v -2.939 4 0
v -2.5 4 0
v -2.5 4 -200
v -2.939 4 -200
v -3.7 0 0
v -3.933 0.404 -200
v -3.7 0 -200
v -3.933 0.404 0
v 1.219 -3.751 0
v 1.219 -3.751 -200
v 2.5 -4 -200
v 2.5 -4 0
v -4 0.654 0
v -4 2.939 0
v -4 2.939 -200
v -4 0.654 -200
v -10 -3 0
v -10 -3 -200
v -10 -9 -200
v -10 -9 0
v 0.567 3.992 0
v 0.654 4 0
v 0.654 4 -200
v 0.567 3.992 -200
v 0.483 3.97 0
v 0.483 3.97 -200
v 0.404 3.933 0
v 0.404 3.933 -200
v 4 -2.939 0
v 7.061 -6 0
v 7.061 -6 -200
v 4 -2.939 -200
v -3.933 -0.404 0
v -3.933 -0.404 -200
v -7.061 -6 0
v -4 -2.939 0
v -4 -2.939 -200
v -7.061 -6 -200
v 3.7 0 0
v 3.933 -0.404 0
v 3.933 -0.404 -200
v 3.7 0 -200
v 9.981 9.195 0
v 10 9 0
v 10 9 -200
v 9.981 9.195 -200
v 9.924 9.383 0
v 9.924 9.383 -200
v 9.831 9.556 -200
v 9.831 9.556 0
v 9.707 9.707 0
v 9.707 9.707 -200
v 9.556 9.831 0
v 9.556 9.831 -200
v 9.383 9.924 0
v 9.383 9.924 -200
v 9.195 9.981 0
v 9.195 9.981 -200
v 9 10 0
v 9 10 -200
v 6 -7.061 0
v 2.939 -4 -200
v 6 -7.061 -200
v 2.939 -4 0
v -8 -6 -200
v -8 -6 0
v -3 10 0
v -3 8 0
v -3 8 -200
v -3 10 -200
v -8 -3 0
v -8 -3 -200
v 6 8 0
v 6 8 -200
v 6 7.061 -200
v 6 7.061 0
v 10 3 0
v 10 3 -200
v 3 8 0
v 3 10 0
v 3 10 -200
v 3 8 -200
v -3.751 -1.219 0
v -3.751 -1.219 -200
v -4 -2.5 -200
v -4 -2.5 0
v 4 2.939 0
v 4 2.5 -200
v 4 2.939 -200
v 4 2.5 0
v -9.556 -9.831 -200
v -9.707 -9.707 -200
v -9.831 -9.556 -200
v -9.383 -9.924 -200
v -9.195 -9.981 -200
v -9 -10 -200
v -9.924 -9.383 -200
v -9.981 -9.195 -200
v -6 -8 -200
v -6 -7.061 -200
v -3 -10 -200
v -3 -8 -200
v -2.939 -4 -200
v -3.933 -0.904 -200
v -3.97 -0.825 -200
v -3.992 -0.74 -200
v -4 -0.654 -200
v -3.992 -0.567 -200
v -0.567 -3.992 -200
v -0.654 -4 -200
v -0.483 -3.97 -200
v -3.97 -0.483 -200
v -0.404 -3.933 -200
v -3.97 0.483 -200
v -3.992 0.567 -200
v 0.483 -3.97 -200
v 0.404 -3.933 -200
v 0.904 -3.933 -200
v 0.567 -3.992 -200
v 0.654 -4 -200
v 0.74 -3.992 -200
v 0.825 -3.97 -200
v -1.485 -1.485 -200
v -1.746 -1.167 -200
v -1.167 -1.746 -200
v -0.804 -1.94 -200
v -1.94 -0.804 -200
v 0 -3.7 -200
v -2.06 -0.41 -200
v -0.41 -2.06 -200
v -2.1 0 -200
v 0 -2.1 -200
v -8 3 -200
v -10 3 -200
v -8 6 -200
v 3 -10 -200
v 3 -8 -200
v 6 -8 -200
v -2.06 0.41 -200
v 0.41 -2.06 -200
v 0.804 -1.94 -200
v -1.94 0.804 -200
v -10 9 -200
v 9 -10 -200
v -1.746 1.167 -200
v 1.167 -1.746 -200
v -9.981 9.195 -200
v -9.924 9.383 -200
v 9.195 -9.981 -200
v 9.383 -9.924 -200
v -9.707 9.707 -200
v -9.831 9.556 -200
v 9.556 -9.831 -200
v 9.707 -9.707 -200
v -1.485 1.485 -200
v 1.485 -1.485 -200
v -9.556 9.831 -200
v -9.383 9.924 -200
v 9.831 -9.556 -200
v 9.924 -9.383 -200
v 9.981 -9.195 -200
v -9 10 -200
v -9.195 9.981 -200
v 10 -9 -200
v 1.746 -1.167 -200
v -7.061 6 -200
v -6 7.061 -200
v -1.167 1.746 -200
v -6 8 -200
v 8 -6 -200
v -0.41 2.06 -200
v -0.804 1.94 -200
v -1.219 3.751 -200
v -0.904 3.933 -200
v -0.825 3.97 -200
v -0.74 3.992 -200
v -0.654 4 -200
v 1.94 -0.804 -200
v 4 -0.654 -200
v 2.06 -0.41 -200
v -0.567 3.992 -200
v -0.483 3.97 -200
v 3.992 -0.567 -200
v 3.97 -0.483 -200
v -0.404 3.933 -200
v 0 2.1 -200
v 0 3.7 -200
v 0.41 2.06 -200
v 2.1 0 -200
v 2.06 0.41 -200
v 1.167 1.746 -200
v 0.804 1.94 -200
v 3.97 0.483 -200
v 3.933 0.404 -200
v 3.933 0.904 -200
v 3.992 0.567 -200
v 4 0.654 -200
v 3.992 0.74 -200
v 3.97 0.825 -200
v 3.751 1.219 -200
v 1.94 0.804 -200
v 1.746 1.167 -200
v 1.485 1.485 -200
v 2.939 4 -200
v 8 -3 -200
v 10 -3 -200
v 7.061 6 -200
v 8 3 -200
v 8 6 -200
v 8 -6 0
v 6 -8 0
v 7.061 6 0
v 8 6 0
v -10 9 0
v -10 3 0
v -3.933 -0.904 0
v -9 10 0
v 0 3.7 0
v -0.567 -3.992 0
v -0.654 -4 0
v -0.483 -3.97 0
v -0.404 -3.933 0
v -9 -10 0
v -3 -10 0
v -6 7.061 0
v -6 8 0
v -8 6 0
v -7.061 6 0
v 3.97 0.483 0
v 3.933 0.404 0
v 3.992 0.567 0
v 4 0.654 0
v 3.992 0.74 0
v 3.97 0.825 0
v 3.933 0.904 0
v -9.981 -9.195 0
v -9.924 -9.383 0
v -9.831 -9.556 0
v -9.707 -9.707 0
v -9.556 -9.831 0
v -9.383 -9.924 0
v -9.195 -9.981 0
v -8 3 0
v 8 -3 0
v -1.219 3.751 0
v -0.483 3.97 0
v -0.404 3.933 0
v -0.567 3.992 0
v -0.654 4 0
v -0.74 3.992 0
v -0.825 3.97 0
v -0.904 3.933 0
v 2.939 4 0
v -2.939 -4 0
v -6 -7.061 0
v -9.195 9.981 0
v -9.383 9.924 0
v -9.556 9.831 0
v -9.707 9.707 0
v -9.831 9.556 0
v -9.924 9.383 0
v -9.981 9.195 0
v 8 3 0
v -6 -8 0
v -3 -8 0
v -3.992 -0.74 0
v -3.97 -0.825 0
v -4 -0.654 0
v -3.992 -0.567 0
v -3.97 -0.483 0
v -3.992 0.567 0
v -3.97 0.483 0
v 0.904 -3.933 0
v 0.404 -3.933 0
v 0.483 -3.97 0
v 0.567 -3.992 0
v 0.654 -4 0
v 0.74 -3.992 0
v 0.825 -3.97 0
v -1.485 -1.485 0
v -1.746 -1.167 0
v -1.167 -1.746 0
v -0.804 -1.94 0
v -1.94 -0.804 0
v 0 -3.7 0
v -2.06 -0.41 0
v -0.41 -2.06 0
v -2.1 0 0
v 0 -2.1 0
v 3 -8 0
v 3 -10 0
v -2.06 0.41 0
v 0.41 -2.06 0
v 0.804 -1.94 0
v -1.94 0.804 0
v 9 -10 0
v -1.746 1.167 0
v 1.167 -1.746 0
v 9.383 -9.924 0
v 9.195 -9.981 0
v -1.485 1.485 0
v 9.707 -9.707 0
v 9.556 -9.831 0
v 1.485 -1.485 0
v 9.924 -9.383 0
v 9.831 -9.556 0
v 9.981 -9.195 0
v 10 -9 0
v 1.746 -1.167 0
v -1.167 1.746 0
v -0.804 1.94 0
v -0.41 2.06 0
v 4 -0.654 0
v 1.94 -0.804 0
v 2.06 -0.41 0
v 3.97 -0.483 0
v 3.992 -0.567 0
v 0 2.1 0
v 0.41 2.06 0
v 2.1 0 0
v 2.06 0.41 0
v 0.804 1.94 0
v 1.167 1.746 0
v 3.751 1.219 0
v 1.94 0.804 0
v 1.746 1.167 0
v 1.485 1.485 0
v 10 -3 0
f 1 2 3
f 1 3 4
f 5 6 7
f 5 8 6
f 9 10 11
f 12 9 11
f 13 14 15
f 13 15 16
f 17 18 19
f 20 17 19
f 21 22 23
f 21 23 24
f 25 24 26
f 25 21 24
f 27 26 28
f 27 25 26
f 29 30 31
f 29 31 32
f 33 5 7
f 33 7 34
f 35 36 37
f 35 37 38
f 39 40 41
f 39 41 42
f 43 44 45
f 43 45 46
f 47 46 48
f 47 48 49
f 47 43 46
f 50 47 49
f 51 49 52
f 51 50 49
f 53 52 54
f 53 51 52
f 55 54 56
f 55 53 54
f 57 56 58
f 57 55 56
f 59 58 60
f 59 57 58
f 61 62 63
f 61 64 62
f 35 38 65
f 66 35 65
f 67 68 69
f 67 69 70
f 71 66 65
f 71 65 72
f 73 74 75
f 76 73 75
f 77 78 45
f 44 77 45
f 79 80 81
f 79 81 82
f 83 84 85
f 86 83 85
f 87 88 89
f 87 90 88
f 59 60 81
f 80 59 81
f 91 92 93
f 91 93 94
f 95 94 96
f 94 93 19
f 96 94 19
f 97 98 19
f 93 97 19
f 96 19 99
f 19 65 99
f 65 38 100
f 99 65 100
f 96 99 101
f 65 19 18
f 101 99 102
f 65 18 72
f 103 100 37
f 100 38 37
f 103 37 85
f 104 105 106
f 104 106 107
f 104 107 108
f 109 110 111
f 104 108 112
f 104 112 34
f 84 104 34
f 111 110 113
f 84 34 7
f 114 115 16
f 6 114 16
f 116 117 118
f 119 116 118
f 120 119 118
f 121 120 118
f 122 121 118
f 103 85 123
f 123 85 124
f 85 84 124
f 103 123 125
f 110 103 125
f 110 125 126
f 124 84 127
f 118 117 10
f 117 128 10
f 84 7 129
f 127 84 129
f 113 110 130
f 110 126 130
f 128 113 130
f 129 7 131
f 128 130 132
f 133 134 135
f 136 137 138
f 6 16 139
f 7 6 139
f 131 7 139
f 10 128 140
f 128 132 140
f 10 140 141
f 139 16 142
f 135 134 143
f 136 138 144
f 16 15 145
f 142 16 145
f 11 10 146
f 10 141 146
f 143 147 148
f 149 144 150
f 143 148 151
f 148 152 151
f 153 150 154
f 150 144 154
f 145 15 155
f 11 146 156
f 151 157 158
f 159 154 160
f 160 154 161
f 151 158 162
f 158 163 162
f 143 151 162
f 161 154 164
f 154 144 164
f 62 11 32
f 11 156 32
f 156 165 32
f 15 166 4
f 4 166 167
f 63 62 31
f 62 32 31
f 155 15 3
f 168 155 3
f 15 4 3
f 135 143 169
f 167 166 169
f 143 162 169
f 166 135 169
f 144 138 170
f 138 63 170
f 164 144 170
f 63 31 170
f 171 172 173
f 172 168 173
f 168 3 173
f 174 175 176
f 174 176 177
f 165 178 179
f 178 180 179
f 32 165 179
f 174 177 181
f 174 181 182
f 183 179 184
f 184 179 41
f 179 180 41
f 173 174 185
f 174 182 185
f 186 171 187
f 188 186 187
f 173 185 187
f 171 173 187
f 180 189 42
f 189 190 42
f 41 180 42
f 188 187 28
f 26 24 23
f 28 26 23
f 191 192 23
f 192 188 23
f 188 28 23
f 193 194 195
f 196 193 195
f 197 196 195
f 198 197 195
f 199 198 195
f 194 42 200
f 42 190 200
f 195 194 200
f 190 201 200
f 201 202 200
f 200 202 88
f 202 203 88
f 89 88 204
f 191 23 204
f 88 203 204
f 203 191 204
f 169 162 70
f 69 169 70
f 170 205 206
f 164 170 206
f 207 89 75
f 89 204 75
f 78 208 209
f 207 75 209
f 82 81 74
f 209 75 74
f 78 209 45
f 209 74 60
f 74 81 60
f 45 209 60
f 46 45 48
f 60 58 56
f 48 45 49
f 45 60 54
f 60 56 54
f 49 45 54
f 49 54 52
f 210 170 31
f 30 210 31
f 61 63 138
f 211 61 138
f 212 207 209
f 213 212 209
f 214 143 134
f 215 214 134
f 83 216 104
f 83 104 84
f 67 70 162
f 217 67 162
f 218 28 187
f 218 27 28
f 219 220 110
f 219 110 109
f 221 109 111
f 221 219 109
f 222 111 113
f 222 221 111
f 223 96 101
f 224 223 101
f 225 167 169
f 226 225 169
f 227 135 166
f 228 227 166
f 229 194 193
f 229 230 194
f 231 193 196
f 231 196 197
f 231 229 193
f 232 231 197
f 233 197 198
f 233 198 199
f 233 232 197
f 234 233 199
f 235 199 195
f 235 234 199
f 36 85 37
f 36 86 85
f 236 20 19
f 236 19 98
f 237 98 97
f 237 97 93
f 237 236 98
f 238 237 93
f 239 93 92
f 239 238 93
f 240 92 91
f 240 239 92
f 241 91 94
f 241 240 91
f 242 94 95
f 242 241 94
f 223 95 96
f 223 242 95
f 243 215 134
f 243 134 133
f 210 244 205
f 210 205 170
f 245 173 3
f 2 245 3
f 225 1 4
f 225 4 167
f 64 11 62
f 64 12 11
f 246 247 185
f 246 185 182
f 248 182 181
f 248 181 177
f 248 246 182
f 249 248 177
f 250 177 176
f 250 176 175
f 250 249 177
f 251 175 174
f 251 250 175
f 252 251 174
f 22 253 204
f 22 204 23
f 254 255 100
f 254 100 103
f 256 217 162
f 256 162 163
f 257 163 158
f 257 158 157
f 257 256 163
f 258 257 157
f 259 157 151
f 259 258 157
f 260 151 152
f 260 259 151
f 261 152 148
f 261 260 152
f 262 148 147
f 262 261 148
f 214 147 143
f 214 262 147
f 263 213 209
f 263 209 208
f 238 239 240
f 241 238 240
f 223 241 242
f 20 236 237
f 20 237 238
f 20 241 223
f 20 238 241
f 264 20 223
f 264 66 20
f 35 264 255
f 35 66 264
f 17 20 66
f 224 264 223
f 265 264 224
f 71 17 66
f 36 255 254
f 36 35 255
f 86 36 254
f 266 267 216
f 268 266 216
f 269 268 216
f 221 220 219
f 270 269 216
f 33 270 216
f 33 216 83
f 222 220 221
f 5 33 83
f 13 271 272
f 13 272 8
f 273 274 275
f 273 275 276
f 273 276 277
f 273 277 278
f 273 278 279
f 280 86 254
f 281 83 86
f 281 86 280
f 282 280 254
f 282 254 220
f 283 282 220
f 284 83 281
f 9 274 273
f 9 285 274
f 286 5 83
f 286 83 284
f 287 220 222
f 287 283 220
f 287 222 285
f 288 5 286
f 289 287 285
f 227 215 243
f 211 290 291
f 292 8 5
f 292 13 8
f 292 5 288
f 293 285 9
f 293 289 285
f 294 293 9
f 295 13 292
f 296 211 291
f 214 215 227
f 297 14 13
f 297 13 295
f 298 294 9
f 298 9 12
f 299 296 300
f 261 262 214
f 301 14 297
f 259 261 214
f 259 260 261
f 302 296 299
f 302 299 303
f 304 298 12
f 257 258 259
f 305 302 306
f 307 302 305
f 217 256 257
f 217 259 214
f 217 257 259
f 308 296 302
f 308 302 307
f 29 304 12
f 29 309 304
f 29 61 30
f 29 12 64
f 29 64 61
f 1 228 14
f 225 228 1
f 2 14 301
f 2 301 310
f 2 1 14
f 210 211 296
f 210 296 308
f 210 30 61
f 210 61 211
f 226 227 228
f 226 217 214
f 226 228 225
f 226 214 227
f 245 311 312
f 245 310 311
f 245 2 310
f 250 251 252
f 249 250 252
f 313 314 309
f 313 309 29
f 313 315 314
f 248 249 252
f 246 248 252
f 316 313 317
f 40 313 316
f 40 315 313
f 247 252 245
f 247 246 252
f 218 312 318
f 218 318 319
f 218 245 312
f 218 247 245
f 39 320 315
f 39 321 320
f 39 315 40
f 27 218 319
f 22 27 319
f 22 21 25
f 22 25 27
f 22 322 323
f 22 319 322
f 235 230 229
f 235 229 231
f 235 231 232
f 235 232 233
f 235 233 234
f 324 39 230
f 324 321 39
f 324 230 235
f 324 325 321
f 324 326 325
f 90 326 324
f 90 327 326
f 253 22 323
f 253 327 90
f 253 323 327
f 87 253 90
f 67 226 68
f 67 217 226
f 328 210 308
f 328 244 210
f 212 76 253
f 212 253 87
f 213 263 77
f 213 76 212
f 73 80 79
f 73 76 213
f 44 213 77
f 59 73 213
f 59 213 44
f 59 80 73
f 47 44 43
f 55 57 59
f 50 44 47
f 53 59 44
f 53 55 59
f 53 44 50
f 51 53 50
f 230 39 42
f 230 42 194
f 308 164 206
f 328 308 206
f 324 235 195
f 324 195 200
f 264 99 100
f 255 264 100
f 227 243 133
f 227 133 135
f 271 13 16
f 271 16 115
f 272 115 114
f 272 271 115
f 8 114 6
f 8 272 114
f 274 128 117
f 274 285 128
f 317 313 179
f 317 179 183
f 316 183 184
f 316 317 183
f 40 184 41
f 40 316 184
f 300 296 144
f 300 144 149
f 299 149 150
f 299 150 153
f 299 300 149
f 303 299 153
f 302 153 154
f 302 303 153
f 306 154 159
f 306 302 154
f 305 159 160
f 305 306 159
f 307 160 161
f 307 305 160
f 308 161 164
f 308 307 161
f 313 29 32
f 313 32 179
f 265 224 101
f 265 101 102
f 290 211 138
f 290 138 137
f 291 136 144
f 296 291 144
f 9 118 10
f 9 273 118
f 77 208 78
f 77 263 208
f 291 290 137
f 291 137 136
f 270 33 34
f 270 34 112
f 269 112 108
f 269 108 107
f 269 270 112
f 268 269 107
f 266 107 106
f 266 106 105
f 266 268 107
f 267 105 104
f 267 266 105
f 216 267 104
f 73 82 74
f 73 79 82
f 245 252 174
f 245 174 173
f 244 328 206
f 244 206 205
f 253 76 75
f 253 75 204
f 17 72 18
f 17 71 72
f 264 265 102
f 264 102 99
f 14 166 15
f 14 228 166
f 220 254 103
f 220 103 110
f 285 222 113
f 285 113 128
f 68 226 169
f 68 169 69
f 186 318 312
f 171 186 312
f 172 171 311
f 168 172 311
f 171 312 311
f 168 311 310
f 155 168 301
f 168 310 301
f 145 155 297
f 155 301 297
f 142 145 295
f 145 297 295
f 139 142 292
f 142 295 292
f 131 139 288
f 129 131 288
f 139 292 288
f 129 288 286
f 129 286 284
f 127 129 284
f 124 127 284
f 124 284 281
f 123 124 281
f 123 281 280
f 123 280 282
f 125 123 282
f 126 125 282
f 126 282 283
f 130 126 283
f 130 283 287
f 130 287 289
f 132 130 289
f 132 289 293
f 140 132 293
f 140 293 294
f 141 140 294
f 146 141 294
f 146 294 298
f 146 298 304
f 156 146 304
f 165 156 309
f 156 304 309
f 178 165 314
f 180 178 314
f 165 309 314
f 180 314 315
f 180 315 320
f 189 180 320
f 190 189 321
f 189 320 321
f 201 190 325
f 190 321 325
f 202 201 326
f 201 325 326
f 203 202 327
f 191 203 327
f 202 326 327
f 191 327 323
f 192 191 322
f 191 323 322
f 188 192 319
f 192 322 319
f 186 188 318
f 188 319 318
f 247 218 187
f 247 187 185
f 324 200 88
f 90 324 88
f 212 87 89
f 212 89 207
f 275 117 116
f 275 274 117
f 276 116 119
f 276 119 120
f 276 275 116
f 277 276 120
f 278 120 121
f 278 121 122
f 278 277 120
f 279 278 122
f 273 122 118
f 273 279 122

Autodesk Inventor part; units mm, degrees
sketch "Sketch_75" plane through (0, 0, 0) normal (0, 0, 1) x (1, 0, 0)
  line L0 (-10, -3) -> (-10, -9)
  arc A0 (-10, -9) -> (-9, -10) centre (-9, -9) ccw
  line L1 (-9, -10) -> (-3, -10)
  line L2 (-3, -10) -> (-3, -8)
  line L3 (-3, -8) -> (-6, -8)
  line L4 (-6, -8) -> (-6, -7.0607)
  line L5 (-6, -7.0607) -> (-2.9393, -4)
  line L6 (-2.9393, -4) -> (-0.6536, -4)
  arc A1 (-0.6536, -4) -> (-0.4036, -3.933) centre (-0.6536, -3.5) ccw
  line L7 (-0.4036, -3.933) -> (0, -3.7)
  line L8 (0, -3.7) -> (0.4036, -3.933)
  arc A2 (0.4036, -3.933) -> (0.9036, -3.933) centre (0.6536, -3.5) ccw
  line L9 (0.9036, -3.933) -> (1.2189, -3.751)
  line L10 (1.2189, -3.751) -> (2.5, -4)
  line L11 (2.5, -4) -> (2.9393, -4)
  line L12 (2.9393, -4) -> (6, -7.0607)
  line L13 (6, -7.0607) -> (6, -8)
  line L14 (6, -8) -> (3, -8)
  line L15 (3, -8) -> (3, -10)
  line L16 (3, -10) -> (9, -10)
  arc A3 (9, -10) -> (10, -9) centre (9, -9) ccw
  line L17 (10, -9) -> (10, -3)
  line L18 (10, -3) -> (8, -3)
  line L19 (8, -3) -> (8, -6)
  line L20 (8, -6) -> (7.0607, -6)
  line L21 (7.0607, -6) -> (4, -2.9393)
  line L22 (4, -2.9393) -> (4, -0.6536)
  arc A4 (4, -0.6536) -> (3.933, -0.4036) centre (3.5, -0.6536) ccw
  line L23 (3.933, -0.4036) -> (3.7, 0)
  line L24 (3.7, 0) -> (3.933, 0.4036)
  arc A5 (3.933, 0.4036) -> (3.933, 0.9036) centre (3.5, 0.6536) ccw
  line L25 (3.933, 0.9036) -> (3.751, 1.2189)
  line L26 (3.751, 1.2189) -> (4, 2.5)
  line L27 (4, 2.5) -> (4, 2.9393)
  line L28 (4, 2.9393) -> (7.0607, 6)
  line L29 (7.0607, 6) -> (8, 6)
  line L30 (8, 6) -> (8, 3)
  line L31 (8, 3) -> (10, 3)
  line L32 (10, 3) -> (10, 9)
  arc A6 (10, 9) -> (9, 10) centre (9, 9) ccw
  line L33 (9, 10) -> (3, 10)
  line L34 (3, 10) -> (3, 8)
  line L35 (3, 8) -> (6, 8)
  line L36 (6, 8) -> (6, 7.0607)
  line L37 (6, 7.0607) -> (2.9393, 4)
  line L38 (2.9393, 4) -> (0.6536, 4)
  arc A7 (0.6536, 4) -> (0.4036, 3.933) centre (0.6536, 3.5) ccw
  line L39 (0.4036, 3.933) -> (0, 3.7)
  line L40 (0, 3.7) -> (-0.4036, 3.933)
  arc A8 (-0.4036, 3.933) -> (-0.9036, 3.933) centre (-0.6536, 3.5) ccw
  line L41 (-0.9036, 3.933) -> (-1.2189, 3.751)
  line L42 (-1.2189, 3.751) -> (-2.5, 4)
  line L43 (-2.5, 4) -> (-2.9393, 4)
  line L44 (-2.9393, 4) -> (-6, 7.0607)
  line L45 (-6, 7.0607) -> (-6, 8)
  line L46 (-6, 8) -> (-3, 8)
  line L47 (-3, 8) -> (-3, 10)
  line L48 (-3, 10) -> (-9, 10)
  arc A9 (-9, 10) -> (-10, 9) centre (-9, 9) ccw
  line L49 (-10, 9) -> (-10, 3)
  line L50 (-10, 3) -> (-8, 3)
  line L51 (-8, 3) -> (-8, 6)
  line L52 (-8, 6) -> (-7.0607, 6)
  line L53 (-7.0607, 6) -> (-4, 2.9393)
  line L54 (-4, 2.9393) -> (-4, 0.6536)
  arc A10 (-4, 0.6536) -> (-3.933, 0.4036) centre (-3.5, 0.6536) ccw
  line L55 (-3.933, 0.4036) -> (-3.7, 0)
  line L56 (-3.7, 0) -> (-3.933, -0.4036)
  arc A11 (-3.933, -0.4036) -> (-3.933, -0.9036) centre (-3.5, -0.6536) ccw
  line L57 (-3.933, -0.9036) -> (-3.751, -1.2189)
  line L58 (-3.751, -1.2189) -> (-4, -2.5)
  line L59 (-4, -2.5) -> (-4, -2.9393)
  line L60 (-4, -2.9393) -> (-7.0607, -6)
  line L61 (-7.0607, -6) -> (-8, -6)
  line L62 (-8, -6) -> (-8, -3)
  line L63 (-8, -3) -> (-10, -3)
extrude "Extrusion1" add sketch "Sketch_75" against normal blind 200
sketch "Sketch2" plane through (0, 0, -200) normal (0, 0, -1) x (-1, 0, 0)
  point P0 (0, 0)
hole "Hole1" at (0, 0, -200) direction (0, 0, 1) diameter 4.2 end through all
ref_plane "C1_XY" through (0, 0, 0) normal (0, 0, 1) x (1, 0, 0)
ref_plane "C1_YZ" through (0, 0, 0) normal (1, 0, 0) x (0, 1, 0)
ref_plane "C1_ZX" through (0, 0, 0) normal (0, 1, 0) x (0, 0, 1)
properties part number "NFS5-2020-short" material "アルミニウム 6061"
